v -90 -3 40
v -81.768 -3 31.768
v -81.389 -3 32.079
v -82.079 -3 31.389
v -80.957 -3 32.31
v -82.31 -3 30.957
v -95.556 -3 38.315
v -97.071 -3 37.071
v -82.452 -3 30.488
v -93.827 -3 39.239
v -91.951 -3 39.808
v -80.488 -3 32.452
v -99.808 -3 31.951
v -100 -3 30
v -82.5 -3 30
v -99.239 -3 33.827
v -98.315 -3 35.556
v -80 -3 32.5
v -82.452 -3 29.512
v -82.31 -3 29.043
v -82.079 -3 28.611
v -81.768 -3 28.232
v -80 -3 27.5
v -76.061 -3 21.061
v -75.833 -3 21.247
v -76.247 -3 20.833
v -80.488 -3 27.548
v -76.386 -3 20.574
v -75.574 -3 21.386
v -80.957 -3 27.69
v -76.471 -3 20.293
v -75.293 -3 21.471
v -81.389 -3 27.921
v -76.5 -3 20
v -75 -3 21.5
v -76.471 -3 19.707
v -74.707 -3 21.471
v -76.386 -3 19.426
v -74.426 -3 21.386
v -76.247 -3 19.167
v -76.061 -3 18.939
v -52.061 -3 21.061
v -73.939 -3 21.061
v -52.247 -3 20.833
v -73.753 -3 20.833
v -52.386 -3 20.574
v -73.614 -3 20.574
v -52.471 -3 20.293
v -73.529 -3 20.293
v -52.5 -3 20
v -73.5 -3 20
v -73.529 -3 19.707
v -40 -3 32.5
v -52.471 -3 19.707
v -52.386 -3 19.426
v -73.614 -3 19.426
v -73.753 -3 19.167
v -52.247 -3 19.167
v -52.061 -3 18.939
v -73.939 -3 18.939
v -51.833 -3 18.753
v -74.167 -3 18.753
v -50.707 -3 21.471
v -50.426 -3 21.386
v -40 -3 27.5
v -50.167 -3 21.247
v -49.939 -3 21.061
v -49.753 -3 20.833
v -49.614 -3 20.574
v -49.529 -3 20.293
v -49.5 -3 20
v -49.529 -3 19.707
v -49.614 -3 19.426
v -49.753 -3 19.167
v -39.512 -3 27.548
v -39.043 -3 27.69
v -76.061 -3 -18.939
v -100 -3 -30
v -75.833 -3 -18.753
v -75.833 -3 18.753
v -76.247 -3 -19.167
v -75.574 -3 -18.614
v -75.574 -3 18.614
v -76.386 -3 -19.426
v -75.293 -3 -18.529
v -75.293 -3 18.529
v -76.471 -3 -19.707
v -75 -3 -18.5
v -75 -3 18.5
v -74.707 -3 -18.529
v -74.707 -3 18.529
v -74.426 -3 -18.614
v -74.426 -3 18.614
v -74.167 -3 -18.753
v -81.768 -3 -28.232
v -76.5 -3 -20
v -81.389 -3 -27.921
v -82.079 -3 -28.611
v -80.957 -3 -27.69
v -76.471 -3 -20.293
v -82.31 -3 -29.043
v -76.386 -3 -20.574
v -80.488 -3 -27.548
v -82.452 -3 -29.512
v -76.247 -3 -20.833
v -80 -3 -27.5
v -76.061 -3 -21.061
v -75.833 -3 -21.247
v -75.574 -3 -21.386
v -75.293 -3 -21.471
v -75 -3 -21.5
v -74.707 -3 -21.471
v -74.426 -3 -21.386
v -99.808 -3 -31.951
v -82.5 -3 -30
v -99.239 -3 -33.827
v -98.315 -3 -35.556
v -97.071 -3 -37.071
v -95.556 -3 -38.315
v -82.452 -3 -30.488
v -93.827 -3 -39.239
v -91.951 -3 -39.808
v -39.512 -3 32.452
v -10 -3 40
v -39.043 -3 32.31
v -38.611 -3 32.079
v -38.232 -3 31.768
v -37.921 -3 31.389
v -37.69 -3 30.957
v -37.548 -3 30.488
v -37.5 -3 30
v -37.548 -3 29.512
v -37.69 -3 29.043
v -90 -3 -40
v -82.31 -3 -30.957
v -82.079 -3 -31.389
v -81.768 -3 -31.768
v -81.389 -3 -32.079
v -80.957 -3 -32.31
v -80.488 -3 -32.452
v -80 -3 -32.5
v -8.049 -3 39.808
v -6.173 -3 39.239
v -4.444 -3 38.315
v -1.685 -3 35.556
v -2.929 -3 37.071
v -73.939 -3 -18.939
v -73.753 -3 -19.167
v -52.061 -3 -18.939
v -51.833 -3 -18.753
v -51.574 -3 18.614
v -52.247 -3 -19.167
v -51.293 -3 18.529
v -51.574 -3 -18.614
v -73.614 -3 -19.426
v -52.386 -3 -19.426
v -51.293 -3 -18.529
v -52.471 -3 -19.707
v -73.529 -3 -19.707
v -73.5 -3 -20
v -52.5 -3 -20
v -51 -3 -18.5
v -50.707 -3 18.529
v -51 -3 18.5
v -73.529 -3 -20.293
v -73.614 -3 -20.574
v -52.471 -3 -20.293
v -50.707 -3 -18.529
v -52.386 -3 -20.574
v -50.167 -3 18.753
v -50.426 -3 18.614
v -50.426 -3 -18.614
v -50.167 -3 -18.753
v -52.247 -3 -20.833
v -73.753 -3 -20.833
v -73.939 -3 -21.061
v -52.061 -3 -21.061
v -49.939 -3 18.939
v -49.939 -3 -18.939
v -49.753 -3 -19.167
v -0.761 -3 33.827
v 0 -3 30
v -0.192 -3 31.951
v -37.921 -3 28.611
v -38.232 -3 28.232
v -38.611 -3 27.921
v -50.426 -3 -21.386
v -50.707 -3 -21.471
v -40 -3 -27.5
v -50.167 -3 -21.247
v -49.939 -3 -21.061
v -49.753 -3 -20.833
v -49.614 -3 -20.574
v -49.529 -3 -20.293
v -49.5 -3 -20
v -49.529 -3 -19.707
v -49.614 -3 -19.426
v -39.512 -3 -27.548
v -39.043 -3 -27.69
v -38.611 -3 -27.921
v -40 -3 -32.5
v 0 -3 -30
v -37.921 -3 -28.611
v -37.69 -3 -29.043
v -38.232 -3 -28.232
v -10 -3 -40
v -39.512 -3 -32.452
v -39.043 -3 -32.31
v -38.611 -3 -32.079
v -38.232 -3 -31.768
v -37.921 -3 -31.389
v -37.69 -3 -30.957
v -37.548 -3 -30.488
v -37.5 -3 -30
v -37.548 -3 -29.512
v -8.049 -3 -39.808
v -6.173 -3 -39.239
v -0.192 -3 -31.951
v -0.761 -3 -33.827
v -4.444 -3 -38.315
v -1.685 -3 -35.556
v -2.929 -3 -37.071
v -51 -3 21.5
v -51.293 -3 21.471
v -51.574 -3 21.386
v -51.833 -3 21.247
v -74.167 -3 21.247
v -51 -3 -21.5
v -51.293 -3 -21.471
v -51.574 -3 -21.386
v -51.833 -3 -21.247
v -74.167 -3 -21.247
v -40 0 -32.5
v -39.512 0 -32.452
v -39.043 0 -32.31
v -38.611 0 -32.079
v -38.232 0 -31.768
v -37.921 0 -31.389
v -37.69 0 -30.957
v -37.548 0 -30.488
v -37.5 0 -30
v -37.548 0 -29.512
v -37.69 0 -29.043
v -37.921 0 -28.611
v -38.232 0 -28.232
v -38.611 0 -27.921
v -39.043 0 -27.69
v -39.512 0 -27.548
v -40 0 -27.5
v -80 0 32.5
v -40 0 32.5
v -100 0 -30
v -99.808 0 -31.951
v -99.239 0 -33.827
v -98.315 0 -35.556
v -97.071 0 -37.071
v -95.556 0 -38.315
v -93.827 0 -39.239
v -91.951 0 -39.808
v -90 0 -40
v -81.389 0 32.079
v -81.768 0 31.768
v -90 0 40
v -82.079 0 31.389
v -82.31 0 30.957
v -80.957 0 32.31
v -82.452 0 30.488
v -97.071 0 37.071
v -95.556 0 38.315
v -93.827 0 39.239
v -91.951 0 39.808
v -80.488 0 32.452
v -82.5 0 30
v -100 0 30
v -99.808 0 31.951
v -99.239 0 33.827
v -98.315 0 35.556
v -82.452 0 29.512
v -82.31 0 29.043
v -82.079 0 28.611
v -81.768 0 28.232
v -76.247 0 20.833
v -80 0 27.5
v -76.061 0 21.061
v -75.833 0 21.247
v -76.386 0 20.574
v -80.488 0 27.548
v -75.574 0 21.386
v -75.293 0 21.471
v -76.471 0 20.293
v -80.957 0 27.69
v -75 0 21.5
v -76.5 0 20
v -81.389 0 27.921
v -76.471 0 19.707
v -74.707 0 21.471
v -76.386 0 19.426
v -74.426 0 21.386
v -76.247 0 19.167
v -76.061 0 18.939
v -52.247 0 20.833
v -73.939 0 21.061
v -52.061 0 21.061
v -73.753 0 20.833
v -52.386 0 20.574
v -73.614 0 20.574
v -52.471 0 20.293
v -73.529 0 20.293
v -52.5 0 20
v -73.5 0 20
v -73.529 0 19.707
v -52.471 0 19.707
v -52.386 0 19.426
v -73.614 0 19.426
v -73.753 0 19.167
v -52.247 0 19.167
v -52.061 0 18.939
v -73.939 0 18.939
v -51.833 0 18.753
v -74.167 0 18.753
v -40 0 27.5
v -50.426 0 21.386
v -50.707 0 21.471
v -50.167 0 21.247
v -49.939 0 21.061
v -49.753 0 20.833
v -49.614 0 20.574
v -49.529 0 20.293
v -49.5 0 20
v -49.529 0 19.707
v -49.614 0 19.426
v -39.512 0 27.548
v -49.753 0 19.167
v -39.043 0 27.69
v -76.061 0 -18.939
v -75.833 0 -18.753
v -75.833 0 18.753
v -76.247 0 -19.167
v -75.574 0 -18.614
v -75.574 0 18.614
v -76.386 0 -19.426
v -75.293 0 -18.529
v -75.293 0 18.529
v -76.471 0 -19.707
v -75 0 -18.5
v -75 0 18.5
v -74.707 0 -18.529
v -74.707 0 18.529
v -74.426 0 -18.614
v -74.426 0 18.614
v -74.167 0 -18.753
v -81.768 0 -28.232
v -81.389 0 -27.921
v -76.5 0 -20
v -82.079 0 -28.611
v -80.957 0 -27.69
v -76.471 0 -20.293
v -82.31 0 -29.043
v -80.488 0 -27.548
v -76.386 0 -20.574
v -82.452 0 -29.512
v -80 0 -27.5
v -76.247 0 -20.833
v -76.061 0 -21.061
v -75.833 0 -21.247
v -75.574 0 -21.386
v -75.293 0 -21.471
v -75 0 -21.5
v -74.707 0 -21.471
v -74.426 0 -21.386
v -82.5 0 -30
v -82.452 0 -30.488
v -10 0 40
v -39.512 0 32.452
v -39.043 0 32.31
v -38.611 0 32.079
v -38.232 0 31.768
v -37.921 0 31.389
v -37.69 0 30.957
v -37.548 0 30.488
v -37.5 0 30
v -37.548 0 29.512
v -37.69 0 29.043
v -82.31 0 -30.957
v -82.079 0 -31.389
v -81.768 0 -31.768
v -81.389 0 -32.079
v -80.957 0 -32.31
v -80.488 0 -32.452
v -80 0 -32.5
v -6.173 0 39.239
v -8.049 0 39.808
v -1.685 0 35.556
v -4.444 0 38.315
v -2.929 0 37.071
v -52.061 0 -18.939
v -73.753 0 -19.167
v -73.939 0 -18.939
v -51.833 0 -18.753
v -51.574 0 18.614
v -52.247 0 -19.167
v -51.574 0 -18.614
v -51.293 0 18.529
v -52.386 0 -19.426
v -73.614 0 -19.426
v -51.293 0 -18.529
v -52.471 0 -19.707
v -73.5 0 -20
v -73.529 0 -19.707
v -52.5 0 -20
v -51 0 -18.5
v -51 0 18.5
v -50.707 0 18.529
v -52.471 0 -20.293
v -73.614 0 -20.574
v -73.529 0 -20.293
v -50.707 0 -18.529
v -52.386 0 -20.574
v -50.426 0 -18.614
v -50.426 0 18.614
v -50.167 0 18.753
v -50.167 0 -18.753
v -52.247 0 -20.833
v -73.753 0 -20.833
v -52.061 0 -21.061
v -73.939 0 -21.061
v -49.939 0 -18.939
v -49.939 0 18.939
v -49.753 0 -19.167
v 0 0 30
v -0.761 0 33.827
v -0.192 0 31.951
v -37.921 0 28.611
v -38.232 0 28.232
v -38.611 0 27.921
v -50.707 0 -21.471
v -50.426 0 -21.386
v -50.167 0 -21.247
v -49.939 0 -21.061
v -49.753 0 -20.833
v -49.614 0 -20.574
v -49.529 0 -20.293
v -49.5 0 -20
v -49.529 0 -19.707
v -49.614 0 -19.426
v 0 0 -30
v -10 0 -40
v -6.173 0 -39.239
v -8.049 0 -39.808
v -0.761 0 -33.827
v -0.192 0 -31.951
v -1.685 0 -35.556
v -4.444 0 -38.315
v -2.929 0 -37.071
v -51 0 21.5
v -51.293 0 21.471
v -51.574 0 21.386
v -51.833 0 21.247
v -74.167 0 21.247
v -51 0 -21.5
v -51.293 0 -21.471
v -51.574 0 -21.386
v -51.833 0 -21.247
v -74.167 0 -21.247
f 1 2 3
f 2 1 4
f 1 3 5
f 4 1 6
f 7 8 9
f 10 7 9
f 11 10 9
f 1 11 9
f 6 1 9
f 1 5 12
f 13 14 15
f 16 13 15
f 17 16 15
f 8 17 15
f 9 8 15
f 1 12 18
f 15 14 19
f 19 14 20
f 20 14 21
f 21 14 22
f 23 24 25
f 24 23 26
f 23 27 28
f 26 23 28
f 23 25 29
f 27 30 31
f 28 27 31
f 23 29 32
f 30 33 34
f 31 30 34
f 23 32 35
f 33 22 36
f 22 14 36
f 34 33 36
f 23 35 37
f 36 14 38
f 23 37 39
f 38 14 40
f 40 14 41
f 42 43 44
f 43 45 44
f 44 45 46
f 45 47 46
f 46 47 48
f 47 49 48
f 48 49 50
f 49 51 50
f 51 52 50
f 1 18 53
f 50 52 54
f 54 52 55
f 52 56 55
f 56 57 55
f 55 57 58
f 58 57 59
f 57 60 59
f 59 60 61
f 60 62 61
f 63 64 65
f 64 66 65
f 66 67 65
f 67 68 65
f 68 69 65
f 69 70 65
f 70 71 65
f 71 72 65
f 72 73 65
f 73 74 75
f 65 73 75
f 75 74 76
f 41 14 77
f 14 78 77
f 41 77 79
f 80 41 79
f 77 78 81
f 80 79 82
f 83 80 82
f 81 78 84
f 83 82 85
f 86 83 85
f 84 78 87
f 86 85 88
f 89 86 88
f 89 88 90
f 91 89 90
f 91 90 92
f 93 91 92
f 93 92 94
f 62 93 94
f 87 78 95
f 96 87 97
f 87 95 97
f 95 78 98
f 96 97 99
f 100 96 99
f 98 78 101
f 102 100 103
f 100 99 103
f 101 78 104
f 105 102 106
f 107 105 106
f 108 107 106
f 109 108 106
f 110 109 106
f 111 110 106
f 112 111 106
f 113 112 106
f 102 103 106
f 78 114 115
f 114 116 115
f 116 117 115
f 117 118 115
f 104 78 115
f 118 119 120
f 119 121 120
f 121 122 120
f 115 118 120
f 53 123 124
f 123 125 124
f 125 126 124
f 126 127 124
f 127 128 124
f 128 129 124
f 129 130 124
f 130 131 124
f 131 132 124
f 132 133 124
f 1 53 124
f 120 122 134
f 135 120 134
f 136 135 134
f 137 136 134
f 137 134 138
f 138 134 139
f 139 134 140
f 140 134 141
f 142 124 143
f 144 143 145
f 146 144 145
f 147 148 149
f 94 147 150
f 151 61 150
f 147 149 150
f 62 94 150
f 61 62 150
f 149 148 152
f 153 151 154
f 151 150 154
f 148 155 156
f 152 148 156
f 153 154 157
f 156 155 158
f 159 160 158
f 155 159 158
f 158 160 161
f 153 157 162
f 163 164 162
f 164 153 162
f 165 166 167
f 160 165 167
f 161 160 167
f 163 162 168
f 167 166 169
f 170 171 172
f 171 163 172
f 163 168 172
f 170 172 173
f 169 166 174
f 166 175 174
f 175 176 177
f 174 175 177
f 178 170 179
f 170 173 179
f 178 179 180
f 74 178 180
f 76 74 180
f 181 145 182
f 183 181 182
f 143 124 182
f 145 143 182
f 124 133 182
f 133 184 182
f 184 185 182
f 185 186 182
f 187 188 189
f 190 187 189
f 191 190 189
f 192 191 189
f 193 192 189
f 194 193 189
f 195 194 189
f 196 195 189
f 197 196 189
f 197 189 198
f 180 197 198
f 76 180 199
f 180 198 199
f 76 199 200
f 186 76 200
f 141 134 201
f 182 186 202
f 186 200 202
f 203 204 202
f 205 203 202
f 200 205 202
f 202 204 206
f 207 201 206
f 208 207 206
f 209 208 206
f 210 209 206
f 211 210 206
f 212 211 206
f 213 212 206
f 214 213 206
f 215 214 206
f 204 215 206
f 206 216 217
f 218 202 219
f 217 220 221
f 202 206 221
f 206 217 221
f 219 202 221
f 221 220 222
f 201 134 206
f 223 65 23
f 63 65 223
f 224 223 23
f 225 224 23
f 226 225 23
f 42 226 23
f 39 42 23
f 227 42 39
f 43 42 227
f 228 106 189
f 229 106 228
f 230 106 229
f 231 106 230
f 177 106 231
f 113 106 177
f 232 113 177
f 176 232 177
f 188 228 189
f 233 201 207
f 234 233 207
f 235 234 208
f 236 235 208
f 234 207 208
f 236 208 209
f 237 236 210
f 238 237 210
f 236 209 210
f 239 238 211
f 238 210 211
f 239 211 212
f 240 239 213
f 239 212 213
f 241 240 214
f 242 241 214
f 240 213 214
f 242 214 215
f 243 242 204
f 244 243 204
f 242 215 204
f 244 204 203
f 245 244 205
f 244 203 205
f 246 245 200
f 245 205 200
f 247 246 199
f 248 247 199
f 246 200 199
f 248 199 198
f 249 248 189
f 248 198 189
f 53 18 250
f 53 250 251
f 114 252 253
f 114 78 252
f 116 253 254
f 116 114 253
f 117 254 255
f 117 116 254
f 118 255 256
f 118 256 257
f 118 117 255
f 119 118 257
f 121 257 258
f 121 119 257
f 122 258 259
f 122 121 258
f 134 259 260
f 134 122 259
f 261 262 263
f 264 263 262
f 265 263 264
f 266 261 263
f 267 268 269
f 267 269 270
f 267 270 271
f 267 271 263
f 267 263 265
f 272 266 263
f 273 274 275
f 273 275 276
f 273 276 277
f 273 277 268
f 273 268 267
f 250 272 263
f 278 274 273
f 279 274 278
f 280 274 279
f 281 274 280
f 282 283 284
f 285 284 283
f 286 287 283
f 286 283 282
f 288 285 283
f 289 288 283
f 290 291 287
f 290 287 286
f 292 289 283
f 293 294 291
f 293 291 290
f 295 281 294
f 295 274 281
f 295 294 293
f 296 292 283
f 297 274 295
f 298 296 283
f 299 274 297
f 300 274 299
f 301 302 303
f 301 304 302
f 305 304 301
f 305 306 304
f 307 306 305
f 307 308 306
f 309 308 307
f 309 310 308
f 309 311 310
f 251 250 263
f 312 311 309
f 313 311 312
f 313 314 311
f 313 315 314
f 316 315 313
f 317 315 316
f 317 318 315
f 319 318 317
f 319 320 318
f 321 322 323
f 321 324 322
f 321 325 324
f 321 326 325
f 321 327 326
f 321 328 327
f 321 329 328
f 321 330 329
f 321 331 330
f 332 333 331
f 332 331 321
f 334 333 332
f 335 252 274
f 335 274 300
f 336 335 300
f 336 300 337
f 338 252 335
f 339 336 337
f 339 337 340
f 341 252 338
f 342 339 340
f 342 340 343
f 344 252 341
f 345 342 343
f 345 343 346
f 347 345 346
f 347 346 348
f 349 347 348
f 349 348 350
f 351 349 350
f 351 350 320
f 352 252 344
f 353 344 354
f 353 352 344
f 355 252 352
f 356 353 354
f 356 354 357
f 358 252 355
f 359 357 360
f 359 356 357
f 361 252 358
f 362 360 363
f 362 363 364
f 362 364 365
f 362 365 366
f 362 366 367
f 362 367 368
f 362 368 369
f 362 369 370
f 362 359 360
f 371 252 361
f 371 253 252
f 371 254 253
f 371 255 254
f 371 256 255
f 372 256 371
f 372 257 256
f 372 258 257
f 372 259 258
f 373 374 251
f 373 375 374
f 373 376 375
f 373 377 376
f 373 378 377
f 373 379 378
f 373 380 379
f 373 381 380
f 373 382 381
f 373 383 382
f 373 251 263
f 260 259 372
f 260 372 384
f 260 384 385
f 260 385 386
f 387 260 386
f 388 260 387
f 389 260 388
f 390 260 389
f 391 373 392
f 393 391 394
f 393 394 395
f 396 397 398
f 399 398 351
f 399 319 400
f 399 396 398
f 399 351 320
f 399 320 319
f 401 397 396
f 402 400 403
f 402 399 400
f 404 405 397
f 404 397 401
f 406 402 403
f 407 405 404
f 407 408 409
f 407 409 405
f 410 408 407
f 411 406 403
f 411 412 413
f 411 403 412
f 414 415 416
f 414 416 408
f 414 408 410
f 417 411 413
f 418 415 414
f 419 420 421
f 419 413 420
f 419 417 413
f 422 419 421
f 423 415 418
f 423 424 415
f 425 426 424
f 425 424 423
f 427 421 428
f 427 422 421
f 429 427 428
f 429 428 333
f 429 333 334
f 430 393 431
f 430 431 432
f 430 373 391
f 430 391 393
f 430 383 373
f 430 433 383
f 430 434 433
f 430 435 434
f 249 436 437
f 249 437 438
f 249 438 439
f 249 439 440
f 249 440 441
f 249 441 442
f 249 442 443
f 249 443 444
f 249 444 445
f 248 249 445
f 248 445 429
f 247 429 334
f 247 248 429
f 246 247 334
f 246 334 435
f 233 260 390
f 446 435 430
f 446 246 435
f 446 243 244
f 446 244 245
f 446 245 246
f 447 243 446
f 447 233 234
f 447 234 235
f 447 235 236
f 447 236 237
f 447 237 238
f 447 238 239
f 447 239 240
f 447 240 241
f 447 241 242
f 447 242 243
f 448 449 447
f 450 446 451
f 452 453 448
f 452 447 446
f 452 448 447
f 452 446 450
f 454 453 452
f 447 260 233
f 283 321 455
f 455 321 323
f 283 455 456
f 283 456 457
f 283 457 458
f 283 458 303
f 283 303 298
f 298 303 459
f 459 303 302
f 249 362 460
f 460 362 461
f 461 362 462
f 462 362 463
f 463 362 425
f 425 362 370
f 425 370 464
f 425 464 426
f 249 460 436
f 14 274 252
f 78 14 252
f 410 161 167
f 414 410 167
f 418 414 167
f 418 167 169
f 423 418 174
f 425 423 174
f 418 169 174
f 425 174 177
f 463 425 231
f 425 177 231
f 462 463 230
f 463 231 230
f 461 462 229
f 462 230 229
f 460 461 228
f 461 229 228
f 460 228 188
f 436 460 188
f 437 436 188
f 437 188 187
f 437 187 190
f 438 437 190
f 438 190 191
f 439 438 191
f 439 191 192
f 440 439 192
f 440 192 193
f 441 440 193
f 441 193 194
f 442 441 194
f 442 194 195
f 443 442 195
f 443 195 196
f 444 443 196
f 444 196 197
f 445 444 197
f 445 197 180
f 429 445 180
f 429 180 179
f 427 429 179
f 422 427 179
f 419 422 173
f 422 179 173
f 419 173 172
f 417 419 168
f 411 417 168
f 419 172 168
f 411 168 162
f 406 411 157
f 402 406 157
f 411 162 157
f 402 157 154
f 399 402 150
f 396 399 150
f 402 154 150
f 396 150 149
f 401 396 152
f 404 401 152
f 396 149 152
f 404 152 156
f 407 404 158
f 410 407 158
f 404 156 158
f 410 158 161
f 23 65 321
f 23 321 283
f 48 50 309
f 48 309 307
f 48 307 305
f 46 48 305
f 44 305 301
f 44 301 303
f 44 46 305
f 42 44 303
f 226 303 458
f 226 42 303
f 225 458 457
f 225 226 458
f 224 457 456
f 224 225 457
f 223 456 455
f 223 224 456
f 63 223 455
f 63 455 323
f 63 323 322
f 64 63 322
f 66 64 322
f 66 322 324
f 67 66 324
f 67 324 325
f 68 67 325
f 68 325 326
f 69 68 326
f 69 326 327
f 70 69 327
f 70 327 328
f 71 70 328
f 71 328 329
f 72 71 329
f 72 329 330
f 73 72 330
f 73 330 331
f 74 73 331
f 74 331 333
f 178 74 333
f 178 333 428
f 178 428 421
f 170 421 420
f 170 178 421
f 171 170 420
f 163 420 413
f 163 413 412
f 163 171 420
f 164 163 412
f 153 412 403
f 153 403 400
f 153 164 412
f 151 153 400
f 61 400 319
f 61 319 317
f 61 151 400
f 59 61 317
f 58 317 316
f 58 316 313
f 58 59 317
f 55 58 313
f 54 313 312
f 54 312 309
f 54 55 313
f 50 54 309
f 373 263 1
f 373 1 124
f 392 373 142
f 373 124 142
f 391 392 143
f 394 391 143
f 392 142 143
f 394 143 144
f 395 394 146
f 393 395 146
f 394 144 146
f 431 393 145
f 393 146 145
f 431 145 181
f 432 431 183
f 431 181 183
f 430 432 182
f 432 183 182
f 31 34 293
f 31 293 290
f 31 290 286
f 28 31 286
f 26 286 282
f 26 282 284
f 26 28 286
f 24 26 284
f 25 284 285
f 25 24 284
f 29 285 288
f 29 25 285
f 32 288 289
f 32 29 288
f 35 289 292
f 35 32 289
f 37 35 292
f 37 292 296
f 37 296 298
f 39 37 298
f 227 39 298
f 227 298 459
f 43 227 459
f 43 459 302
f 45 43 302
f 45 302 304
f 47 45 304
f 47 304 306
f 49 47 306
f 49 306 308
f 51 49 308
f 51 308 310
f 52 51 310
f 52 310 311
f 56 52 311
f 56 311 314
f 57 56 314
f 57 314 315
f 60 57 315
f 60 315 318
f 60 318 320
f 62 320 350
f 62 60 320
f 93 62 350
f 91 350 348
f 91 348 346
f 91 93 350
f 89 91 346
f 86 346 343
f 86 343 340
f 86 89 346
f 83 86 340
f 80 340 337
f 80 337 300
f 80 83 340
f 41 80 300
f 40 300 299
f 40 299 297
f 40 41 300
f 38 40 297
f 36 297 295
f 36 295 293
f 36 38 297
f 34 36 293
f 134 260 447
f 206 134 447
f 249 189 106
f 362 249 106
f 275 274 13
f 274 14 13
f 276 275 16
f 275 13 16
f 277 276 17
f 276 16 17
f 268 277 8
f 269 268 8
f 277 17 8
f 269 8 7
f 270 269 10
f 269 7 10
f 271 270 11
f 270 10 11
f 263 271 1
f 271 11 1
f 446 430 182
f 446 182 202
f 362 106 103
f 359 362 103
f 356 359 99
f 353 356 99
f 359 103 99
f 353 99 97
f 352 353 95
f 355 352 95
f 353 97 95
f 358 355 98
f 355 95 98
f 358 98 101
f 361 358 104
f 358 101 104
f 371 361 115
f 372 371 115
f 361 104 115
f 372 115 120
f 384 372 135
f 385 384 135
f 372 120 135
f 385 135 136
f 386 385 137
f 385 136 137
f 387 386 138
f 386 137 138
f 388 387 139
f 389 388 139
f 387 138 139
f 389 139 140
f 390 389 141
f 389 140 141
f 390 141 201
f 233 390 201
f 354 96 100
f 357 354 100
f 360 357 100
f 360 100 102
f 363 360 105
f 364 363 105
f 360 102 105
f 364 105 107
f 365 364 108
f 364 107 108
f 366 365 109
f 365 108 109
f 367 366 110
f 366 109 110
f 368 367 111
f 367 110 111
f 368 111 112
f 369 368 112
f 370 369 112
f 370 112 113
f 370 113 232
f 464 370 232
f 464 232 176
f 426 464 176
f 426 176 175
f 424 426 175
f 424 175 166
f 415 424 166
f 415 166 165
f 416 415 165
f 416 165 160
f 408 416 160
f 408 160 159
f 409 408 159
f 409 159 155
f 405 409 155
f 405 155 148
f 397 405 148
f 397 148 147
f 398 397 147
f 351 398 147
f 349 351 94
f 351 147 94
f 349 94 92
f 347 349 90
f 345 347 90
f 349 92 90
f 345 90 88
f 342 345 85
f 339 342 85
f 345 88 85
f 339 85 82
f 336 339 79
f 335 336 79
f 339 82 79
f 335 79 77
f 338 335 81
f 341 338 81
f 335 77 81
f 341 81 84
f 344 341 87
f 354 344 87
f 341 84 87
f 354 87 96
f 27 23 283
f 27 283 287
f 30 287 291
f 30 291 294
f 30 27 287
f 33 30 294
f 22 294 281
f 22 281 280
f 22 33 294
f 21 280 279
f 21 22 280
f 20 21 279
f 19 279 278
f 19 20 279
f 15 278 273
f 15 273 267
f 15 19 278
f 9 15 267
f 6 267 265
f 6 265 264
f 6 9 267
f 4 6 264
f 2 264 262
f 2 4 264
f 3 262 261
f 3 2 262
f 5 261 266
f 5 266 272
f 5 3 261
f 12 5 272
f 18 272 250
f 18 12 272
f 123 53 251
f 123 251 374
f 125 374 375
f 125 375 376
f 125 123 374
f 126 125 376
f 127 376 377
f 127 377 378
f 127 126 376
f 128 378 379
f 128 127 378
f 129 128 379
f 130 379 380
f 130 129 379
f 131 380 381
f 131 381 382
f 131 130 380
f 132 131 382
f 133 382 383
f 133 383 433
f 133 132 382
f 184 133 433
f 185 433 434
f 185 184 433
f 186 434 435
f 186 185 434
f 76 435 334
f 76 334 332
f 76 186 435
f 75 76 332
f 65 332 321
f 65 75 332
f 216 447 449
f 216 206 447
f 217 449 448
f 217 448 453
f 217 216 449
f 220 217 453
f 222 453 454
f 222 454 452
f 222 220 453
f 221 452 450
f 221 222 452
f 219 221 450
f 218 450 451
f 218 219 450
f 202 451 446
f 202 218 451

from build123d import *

# Parameters (mm, degrees)
F0_W     = 100
F0_H     = 40
F1_DEPTH = 3
F3_D     = 3
F7_DEPTH = 25
F8_R     = 10


with BuildPart() as f1:
    # F0 (on Front) → F1 (new body)
    with BuildSketch(Plane.XZ):
        with Locations((-50, -20)):
            Rectangle(F0_W, F0_H)
    extrude(amount=F1_DEPTH)

    # F3 (through all)
    with Locations(Plane(origin=(0, 0, 0), x_dir=(1, 0, 0), z_dir=(0, 1, 0))):
        with Locations((-51, 20), (-75, 20)):
            Hole(F3_D / 2)

    # F6 (on face) → F7 (cut)
    with BuildSketch(Plane.XZ.offset(3)):
        with BuildLine():
            ThreePointArc((-80, -27.5), (-82.5, -30), (-80, -32.5))
            Line((-80, -32.5), (-40, -32.5))
            ThreePointArc((-40, -32.5), (-37.5, -30), (-40, -27.5))
            Line((-40, -27.5), (-80, -27.5))
        make_face()
    extrude(amount=-F7_DEPTH, mode=Mode.SUBTRACT)

    # F8
    f8_edges = [f1.edges().sort_by_distance(p)[0] for p in [
        (-100, -1.5, -40),
        (0, -1.5, -40),
    ]]
    fillet(f8_edges, radius=F8_R)

    # F9: F1 across plane


with BuildPart() as f1_1:
    add(f1.part)
    add(f1.part.mirror(Plane.XY))


solid = f1_1.part
